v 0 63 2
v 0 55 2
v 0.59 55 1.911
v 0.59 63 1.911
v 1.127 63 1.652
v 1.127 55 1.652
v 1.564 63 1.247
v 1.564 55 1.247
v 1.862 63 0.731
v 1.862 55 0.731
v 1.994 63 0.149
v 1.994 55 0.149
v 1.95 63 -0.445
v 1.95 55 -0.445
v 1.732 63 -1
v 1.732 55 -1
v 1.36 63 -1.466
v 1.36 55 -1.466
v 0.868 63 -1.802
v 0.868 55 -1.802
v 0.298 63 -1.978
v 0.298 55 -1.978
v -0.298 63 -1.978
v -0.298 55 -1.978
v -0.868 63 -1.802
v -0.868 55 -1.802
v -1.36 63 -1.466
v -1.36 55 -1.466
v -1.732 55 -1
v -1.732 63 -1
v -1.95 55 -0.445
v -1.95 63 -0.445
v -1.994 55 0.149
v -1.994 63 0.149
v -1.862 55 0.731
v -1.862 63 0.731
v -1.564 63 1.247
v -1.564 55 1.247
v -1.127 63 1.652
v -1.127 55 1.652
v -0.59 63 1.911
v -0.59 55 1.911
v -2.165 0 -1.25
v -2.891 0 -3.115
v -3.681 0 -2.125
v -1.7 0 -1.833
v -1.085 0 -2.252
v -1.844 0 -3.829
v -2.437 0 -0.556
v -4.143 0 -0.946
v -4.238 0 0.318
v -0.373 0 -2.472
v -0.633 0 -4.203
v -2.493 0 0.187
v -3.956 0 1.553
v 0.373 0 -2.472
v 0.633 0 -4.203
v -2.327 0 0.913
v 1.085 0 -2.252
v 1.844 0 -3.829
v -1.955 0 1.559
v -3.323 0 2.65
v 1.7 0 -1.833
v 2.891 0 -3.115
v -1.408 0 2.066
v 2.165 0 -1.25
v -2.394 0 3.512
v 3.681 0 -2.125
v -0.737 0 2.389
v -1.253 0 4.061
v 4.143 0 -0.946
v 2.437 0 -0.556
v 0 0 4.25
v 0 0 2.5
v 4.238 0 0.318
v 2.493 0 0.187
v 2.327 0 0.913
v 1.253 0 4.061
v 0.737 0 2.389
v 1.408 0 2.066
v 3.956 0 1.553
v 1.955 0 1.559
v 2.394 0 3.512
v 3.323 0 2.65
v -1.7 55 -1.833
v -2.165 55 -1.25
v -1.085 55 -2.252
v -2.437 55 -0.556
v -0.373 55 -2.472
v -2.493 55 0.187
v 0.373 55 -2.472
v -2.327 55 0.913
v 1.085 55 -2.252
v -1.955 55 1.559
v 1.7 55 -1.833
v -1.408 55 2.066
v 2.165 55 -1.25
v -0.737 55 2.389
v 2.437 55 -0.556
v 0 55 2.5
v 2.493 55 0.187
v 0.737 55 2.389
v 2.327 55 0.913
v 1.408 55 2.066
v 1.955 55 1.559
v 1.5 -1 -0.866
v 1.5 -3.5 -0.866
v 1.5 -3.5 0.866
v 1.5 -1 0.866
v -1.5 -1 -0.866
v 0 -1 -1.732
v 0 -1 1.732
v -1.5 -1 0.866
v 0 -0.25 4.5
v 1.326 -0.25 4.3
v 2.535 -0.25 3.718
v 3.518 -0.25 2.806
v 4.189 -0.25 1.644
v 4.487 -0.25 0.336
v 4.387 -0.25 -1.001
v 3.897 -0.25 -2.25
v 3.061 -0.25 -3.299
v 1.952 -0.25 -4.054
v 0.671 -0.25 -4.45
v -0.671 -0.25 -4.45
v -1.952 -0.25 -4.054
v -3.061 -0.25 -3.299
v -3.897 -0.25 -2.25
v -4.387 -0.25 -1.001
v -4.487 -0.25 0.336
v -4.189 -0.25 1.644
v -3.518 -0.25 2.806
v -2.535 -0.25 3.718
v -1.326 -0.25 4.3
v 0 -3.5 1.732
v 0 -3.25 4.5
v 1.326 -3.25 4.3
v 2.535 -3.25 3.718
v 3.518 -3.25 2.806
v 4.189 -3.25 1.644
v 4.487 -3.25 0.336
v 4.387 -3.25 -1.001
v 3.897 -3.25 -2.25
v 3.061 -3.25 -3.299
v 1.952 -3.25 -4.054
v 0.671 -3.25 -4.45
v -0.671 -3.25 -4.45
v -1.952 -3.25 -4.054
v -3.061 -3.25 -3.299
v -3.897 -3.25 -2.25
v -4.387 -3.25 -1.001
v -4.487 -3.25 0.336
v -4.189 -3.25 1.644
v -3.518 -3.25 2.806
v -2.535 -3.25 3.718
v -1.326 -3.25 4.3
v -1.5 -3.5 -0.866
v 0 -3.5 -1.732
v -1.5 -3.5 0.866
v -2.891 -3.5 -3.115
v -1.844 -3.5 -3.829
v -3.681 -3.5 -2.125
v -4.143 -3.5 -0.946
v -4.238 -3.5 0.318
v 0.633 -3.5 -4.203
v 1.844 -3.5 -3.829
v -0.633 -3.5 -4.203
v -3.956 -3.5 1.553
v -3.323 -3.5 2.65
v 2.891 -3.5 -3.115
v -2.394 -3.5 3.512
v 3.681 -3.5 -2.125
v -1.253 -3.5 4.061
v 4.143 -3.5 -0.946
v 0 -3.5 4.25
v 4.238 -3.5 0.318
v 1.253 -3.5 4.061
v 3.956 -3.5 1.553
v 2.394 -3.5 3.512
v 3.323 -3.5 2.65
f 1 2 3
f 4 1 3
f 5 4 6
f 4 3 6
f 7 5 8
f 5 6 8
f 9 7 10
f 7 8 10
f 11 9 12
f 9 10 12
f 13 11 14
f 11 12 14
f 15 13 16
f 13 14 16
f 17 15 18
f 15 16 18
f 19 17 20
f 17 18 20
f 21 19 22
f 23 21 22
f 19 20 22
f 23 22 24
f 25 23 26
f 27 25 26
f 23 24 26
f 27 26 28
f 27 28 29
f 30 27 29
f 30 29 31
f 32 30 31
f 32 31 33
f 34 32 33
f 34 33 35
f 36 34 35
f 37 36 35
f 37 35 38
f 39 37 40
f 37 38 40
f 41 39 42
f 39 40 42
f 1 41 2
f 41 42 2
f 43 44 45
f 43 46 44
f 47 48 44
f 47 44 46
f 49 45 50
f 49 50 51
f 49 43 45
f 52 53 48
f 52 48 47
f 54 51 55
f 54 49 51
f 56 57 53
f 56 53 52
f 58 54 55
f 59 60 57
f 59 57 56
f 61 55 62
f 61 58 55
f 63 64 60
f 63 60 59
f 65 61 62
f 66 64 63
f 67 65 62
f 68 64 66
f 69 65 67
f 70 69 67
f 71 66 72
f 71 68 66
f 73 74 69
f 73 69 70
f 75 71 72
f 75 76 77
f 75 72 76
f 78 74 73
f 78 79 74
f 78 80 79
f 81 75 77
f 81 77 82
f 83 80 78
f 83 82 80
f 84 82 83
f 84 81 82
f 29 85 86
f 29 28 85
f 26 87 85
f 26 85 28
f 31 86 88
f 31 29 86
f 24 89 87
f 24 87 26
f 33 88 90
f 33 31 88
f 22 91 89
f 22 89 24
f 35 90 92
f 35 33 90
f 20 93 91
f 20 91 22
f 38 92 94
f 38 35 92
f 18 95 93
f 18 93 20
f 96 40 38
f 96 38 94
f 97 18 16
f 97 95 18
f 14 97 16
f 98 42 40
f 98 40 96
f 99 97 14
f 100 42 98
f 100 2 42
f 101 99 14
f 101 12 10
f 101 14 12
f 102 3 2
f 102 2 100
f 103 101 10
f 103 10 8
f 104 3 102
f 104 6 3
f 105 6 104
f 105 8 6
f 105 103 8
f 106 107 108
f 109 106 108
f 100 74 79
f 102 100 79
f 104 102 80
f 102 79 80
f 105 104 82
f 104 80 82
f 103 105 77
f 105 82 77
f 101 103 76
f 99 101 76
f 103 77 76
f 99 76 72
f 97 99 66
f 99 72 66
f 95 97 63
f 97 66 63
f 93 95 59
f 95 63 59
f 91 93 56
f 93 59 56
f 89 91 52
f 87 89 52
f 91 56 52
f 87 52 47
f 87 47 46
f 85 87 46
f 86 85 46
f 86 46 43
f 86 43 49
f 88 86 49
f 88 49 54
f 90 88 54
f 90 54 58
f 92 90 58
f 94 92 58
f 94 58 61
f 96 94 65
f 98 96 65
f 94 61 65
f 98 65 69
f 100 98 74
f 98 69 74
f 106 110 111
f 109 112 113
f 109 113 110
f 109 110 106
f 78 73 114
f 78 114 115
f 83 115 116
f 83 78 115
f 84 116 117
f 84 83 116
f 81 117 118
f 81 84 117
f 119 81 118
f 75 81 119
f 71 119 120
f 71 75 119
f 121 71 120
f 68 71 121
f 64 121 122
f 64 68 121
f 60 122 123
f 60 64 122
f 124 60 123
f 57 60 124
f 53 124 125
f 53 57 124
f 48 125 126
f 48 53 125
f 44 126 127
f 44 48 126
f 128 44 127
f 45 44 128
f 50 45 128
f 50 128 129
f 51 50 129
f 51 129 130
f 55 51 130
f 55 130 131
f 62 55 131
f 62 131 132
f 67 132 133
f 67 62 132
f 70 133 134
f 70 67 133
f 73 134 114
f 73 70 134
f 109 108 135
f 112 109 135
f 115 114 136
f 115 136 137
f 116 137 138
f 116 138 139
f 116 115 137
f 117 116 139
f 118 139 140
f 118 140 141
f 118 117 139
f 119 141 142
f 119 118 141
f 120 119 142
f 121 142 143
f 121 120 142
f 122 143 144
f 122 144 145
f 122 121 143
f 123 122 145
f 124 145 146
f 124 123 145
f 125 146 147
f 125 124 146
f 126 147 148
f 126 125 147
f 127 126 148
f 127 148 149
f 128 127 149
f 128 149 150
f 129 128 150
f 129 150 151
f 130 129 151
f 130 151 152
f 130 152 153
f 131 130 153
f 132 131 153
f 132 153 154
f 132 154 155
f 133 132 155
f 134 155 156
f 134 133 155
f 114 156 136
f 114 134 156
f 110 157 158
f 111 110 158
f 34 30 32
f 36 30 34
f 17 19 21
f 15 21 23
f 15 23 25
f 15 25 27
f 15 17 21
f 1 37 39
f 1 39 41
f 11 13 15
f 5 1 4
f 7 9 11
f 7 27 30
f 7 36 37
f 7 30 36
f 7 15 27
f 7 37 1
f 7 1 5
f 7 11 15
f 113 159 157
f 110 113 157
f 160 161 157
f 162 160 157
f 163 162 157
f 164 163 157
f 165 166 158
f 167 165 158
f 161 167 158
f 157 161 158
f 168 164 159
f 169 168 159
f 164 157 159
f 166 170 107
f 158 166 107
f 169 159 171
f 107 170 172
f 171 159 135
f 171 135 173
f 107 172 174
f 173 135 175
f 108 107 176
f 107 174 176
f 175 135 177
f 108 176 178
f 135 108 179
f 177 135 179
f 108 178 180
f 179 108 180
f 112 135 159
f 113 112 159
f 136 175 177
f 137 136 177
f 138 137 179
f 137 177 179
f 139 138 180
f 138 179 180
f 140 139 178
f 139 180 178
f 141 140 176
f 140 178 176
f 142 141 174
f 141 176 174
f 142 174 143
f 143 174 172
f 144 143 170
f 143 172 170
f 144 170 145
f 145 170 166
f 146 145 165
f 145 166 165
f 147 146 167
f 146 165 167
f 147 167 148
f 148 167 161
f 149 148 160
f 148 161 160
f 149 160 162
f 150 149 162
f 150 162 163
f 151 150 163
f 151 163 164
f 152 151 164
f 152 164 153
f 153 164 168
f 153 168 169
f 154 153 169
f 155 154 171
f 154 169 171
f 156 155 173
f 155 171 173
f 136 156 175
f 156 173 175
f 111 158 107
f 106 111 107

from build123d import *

# Parameters (mm, degrees)
SKETCH_1_R          = 4.5
EXTRUDE_1_DEPTH     = 3.5
SKETCH_2_R          = 2.5
EXTRUDE_2_DEPTH     = 55
SKETCH_3_R          = 2
EXTRUDE_3_DEPTH     = 8
CUT_EXTRUDE_1_DEPTH = 2.5
CHAMFER_1_SIZE      = 0.25


with BuildPart() as part:
    # 草图1 → 凸台-拉伸1 (new body)
    with BuildSketch(Plane(origin=(0, 0, 0), x_dir=(1, 0, 0), z_dir=(0, 1, 0))):
        with Locations(Location((0, 0, 0), (0, 0, 270))):
            Circle(SKETCH_1_R)
    extrude(amount=-EXTRUDE_1_DEPTH)

    # 草图2 → 凸台-拉伸2 (add)
    with BuildSketch(Plane(origin=(0, 0, 0), x_dir=(1, 0, 0), z_dir=(0, 1, 0))):
        with Locations(Location((0, 0, 0), (0, 0, 270))):
            Circle(SKETCH_2_R)
    extrude(amount=EXTRUDE_2_DEPTH)

    # 草图3 → 凸台-拉伸3 (add)
    with BuildSketch(Plane(origin=(0, 55, 0), x_dir=(1, 0, 0), z_dir=(0, 1, 0))):
        with Locations(Location((0, 0, 0), (0, 0, 270))):
            Circle(SKETCH_3_R)
    extrude(amount=EXTRUDE_3_DEPTH)

    # 草图4 → 切除-拉伸1 (cut)
    with BuildSketch(Plane.XZ.offset(3.5)):
        Polygon((1.5, -0.866025404), (1.5, 0.866025404), (0, 1.732050808), (-1.5, 0.866025404), (-1.5, -0.866025404), (0, -1.732050808), align=None)
    extrude(amount=-CUT_EXTRUDE_1_DEPTH, mode=Mode.SUBTRACT)

    # 倒角1
    chamfer_1_edges = [part.edges().sort_by_distance(p)[0] for p in [
        (0, 0, -4.5),
        (0, -3.5, -4.5),
    ]]
    chamfer(chamfer_1_edges, length=CHAMFER_1_SIZE)


solid = part.part
